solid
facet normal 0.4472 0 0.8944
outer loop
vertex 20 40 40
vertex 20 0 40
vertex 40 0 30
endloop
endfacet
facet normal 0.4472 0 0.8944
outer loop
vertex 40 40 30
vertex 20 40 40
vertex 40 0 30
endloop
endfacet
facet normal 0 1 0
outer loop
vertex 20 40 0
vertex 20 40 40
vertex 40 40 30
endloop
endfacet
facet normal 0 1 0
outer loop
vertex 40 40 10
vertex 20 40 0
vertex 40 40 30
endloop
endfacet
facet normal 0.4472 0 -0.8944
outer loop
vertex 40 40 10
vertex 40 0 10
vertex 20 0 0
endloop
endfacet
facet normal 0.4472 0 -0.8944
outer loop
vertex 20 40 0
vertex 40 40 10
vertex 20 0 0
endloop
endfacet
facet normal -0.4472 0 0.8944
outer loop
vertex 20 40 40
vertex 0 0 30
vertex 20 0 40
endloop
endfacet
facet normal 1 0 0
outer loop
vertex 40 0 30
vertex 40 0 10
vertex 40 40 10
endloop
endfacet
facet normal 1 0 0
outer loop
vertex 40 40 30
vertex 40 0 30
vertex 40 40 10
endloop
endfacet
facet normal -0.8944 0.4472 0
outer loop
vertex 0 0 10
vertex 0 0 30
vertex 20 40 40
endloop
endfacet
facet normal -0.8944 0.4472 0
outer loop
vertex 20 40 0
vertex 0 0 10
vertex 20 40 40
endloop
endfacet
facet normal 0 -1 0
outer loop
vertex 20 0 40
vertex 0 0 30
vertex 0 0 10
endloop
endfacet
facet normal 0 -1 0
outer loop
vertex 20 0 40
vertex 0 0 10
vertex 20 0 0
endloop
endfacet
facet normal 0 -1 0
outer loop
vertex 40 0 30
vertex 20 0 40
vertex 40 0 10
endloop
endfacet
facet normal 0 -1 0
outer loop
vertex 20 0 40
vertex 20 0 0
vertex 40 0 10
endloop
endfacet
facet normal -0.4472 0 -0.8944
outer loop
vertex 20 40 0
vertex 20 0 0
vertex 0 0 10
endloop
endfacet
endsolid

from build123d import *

# Parameters (mm, degrees)
SKETCH1_W           = 40
SKETCH1_H           = 40
BOSS_EXTRUDE1_DEPTH = 40
CUT_EXTRUDE1_DEPTH  = 40
CUT_EXTRUDE2_DEPTH  = 40


with BuildPart() as part:
    # Sketch1 → Boss-Extrude1 (new body)
    with BuildSketch(Plane.XY):
        with Locations((20, 20)):
            Rectangle(SKETCH1_W, SKETCH1_H)
    extrude(amount=BOSS_EXTRUDE1_DEPTH)

    # Sketch2 → Cut-Extrude1 (cut)
    with BuildSketch(Plane.XY.offset(40)):
        Polygon((0, 0), (20, 40), (0, 40), align=None)
    extrude(amount=-CUT_EXTRUDE1_DEPTH, mode=Mode.SUBTRACT)

    # Sketch3 → Cut-Extrude2 (cut)
    with BuildSketch(Plane.XZ):
        Polygon((0, 40), (0, 30), (20, 40), align=None)
        Polygon((0, 0), (20, 0), (0, 10), align=None)
        Polygon((20, 40), (40, 30), (40, 40), align=None)
        Polygon((40, 10), (20, 0), (40, 0), align=None)
    extrude(amount=-CUT_EXTRUDE2_DEPTH, mode=Mode.SUBTRACT)


solid = part.part
